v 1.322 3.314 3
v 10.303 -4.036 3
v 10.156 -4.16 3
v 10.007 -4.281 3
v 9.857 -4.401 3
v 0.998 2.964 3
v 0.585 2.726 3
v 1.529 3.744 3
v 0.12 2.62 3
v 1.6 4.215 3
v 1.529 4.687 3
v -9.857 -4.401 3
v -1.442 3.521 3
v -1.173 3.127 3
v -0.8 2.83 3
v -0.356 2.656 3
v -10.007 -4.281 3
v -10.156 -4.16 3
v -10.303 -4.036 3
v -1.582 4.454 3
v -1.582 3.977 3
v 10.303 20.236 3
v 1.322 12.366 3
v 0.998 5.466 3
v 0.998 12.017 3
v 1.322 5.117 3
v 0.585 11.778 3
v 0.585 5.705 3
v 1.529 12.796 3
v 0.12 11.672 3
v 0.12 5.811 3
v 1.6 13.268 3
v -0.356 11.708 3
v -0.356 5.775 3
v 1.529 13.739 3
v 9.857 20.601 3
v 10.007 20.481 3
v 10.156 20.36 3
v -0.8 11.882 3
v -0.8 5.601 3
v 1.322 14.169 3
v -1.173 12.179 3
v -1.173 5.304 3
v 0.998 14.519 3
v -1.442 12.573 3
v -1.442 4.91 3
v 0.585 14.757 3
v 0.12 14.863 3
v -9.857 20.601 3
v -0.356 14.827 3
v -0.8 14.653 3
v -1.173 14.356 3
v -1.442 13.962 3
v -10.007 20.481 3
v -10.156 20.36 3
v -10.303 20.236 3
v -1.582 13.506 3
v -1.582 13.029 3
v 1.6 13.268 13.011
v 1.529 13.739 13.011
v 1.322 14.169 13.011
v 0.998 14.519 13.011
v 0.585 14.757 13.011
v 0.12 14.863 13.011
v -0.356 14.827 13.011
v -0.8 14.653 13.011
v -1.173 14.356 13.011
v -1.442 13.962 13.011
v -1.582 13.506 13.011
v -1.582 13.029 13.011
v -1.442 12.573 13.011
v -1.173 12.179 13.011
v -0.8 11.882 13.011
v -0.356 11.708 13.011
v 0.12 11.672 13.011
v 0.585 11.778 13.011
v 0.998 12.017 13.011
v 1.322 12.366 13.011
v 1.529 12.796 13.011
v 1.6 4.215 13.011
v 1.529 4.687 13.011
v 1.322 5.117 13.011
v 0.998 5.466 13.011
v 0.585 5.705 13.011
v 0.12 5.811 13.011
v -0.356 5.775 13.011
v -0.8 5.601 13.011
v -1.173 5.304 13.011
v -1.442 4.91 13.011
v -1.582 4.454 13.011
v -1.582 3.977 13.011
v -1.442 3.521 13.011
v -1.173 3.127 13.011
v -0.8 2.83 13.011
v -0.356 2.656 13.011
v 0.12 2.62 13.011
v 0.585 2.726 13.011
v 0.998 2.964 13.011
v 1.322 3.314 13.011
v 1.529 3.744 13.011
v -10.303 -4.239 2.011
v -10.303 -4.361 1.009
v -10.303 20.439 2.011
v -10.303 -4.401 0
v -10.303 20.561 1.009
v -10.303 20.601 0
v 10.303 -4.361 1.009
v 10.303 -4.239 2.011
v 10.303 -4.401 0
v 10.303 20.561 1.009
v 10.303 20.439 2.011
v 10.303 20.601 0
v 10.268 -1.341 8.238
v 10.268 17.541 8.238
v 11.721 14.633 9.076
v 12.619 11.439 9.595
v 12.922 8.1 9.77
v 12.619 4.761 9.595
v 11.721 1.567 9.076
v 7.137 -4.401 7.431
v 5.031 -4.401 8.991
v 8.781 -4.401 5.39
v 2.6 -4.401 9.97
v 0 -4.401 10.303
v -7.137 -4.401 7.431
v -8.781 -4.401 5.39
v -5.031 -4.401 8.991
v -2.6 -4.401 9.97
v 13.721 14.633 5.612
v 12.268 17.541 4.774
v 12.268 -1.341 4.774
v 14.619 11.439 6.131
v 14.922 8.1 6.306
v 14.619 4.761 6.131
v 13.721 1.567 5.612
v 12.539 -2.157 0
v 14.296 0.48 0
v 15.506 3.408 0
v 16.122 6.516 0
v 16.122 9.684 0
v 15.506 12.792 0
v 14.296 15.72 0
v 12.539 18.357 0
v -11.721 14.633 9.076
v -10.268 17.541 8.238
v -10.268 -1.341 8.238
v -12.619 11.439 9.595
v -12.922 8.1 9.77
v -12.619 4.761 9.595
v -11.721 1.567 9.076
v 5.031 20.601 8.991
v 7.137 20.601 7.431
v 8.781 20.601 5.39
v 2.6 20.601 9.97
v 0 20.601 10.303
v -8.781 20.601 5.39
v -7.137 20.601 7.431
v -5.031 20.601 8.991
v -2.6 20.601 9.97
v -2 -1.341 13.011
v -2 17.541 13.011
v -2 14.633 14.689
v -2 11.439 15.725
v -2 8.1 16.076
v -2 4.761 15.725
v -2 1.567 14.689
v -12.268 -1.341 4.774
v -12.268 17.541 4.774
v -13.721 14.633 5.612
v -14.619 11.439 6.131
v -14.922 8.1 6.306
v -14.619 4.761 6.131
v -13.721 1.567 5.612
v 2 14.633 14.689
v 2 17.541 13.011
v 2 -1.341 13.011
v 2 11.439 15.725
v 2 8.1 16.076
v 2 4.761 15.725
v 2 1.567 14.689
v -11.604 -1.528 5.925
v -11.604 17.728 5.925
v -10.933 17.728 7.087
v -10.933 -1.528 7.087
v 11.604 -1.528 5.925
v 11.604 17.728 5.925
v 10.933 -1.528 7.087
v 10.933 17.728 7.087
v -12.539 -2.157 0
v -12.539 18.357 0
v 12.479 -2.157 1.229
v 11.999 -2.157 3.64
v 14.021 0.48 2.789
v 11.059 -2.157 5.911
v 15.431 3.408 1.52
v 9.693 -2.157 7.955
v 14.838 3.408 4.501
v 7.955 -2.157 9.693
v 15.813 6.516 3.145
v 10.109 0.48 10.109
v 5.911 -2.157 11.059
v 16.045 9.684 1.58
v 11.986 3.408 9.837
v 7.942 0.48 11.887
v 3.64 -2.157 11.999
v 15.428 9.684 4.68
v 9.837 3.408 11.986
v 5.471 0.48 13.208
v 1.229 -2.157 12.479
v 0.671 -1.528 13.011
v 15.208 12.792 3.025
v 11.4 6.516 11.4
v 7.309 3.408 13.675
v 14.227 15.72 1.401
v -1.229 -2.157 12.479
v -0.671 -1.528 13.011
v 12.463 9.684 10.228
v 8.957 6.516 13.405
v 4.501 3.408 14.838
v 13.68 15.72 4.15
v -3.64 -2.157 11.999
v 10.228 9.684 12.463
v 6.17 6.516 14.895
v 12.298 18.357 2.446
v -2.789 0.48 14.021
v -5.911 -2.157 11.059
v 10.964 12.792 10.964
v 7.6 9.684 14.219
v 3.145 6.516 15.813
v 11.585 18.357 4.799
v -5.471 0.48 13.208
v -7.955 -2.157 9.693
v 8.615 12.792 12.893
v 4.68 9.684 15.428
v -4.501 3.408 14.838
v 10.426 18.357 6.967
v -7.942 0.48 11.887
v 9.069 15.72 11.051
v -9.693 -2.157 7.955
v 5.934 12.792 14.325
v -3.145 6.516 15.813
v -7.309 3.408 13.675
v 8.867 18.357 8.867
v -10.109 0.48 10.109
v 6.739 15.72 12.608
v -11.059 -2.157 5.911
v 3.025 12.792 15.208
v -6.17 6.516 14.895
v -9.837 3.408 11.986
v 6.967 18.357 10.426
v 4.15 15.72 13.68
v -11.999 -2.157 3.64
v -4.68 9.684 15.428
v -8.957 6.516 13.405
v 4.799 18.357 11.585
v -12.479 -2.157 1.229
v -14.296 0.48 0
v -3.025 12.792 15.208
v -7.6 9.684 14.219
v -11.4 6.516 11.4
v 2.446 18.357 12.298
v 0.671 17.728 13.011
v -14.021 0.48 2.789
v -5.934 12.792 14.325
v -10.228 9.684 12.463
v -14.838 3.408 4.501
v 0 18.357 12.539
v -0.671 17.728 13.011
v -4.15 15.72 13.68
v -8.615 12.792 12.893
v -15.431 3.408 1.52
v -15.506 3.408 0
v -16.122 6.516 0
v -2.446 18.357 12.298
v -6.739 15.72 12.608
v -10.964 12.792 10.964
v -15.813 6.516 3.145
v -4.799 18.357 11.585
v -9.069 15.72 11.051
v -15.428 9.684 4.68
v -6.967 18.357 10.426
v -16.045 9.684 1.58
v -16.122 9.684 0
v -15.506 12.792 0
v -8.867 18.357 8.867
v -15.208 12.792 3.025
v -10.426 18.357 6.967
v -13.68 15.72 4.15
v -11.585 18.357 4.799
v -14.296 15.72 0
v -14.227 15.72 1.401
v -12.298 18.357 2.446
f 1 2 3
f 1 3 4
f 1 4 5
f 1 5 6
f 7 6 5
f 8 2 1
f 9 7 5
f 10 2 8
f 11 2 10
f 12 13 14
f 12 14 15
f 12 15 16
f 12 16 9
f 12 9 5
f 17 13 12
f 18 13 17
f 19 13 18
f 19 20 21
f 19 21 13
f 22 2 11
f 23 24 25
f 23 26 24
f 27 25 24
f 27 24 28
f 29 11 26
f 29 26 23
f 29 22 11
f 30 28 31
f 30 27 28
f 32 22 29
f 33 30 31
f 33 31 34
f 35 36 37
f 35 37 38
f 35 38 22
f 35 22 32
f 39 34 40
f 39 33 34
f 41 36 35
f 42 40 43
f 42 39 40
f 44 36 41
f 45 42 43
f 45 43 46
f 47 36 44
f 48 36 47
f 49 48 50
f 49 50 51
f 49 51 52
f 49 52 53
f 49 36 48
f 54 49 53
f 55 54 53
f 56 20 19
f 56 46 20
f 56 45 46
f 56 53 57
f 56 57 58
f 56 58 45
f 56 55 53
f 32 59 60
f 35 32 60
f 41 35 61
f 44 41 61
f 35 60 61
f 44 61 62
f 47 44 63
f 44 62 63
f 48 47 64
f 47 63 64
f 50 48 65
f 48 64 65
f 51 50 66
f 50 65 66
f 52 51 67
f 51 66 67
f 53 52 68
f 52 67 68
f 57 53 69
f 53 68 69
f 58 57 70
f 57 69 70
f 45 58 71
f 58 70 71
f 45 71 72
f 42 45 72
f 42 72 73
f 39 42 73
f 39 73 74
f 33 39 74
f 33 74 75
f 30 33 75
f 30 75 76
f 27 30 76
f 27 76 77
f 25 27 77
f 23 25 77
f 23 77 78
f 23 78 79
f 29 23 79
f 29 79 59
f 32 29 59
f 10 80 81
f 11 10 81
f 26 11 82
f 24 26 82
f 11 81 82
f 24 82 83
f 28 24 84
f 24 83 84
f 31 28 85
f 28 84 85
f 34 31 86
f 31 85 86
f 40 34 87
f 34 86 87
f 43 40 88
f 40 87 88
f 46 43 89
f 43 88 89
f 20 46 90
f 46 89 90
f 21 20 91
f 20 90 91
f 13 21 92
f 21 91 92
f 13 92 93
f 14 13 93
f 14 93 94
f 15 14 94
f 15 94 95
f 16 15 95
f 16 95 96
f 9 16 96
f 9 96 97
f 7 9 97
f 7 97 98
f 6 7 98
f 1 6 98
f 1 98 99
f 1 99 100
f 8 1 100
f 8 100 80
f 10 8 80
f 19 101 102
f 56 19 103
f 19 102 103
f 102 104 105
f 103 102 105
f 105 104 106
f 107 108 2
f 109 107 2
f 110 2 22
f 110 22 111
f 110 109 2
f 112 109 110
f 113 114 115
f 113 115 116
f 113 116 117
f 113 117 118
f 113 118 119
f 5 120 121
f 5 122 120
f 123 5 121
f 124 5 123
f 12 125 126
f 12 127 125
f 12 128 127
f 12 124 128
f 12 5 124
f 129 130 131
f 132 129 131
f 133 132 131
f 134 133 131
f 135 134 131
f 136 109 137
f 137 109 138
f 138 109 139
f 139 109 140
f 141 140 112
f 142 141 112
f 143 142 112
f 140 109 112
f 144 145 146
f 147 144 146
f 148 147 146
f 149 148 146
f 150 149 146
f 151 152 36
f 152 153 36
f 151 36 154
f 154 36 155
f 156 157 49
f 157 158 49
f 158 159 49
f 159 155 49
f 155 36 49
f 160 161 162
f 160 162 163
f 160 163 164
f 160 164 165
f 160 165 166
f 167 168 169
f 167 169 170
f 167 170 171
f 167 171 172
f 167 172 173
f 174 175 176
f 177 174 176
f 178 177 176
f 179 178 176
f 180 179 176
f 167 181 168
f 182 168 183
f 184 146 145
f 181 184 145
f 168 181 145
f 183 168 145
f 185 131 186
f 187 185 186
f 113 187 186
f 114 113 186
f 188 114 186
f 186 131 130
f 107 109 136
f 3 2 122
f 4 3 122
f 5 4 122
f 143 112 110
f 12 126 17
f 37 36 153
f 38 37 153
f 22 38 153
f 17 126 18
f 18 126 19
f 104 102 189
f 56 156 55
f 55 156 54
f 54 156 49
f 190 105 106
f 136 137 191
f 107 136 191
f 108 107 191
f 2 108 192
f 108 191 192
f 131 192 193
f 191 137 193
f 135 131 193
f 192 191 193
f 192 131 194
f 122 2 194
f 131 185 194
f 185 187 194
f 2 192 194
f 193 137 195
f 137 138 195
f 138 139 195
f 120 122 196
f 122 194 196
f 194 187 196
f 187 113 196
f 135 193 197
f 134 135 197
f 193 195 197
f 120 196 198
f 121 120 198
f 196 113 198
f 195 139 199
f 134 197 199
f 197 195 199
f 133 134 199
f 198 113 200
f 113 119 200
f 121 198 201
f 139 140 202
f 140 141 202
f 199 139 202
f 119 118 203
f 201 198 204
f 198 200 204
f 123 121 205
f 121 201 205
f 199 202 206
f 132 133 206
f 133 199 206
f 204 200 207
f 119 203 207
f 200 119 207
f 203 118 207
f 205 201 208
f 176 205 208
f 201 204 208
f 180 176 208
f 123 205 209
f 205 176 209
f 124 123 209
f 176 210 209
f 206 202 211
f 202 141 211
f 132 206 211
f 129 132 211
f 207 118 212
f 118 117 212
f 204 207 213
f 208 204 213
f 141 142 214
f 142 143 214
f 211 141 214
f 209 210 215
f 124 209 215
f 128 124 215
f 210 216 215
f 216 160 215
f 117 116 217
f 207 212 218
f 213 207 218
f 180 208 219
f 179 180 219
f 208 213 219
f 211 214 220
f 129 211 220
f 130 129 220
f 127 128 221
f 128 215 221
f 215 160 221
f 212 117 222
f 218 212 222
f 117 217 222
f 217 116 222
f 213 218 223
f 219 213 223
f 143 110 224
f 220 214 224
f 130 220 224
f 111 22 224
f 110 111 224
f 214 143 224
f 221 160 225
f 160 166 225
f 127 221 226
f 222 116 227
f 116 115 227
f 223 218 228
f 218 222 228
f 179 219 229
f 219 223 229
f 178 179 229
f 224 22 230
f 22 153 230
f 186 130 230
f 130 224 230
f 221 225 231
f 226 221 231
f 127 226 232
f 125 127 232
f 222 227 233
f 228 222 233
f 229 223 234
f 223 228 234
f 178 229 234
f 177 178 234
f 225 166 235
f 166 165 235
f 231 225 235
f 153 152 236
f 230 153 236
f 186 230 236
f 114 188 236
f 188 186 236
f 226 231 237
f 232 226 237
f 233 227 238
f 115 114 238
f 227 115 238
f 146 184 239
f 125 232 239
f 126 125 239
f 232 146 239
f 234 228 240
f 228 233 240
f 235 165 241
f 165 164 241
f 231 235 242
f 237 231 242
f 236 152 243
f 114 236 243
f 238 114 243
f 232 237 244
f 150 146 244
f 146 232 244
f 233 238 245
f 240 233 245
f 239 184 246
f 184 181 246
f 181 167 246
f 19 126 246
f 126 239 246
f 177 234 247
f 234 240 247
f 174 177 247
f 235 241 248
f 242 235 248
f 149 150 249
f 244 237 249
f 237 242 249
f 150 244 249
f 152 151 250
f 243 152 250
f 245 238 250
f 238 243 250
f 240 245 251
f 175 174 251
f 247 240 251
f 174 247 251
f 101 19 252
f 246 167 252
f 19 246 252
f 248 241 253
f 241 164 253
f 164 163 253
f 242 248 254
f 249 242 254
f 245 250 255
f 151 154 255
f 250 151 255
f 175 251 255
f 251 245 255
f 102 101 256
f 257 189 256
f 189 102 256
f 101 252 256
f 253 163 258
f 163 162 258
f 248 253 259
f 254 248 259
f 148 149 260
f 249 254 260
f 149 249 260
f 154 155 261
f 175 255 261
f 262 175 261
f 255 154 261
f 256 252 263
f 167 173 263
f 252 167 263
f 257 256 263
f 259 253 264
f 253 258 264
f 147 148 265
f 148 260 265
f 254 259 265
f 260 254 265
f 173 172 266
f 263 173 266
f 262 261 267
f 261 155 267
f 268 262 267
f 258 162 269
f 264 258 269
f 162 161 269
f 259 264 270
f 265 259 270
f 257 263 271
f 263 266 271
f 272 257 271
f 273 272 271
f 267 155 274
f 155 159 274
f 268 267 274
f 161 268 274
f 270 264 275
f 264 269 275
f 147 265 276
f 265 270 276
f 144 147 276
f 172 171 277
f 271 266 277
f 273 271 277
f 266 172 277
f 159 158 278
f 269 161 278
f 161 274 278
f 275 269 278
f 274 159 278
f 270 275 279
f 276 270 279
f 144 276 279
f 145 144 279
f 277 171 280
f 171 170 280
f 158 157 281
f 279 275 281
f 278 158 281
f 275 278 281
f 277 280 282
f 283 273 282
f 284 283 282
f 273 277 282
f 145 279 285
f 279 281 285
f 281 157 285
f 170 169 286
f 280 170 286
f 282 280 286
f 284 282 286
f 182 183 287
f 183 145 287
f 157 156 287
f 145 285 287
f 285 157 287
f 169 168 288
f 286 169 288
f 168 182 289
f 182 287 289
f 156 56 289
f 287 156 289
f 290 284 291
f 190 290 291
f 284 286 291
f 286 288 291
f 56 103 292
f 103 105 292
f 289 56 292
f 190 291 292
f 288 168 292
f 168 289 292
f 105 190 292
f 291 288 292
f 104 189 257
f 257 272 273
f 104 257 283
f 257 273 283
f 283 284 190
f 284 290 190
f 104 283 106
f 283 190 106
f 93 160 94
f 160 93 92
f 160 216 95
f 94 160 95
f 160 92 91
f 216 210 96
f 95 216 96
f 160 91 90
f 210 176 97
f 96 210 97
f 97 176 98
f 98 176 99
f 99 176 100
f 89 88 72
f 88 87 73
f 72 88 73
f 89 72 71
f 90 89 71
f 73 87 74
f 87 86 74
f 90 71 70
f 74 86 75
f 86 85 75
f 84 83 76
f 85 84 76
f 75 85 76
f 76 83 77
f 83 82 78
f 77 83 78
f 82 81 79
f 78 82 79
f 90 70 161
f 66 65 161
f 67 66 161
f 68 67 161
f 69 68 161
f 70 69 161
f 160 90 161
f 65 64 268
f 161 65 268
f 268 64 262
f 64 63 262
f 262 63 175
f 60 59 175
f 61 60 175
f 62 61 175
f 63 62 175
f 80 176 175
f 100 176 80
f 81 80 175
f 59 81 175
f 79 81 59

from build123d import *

# Parameters (mm, degrees)
REVOLVE6_ANGLE     = 180
CUT_EXTRUDE3_DEPTH = 34.397155568
SKETCH6_W          = 20.606544016
SKETCH6_H          = 25.002606738
CUT_EXTRUDE4_DEPTH = 3
SKETCH15_W         = 5.12502067
SKETCH15_H         = 26.452748528
CUT_EXTRUDE7_DEPTH = 2
CIRPATTERN1_COUNT  = 6
SKETCH20_R         = 1.6
CUT_EXTRUDE8_DEPTH = 30.260079699


with BuildPart() as part:
    # Sketch1 → Revolve6 (revolve)
    with BuildSketch(Plane.XY):
        with BuildLine():
            Line((0, 24.3), (0, -8.1))
            ThreePointArc((0, -8.1), (16.2, 8.1), (0, 24.3))
        make_face()
    revolve(axis=Axis((0, 24.3, 0), (0, -1, 0)), revolution_arc=REVOLVE6_ANGLE)

    # Sketch7 → Cut-Extrude3 (cut, through all)
    with BuildSketch(Plane(origin=(0, 0, 0), x_dir=(-1, 0, 0), z_dir=(0, 0, -1))):
        with BuildLine():
            Line((-10.303272008, 20.601303369), (10.303272008, 20.601303369))
            ThreePointArc((10.303272008, 20.601303369), (0, 24.3), (-10.303272008, 20.601303369))
        make_face()
        with BuildLine():
            Line((-10.303272008, -4.401303369), (10.303272008, -4.401303369))
            ThreePointArc((10.303272008, -4.401303369), (0, -8.1), (-10.303272008, -4.401303369))
        make_face()
    extrude(amount=-CUT_EXTRUDE3_DEPTH, mode=Mode.SUBTRACT)

    # Sketch6 → Cut-Extrude4 (cut)
    with BuildSketch(Plane(origin=(0, 0, 0), x_dir=(-1, 0, 0), z_dir=(0, 0, -1))):
        with Locations((0, 8.1)):
            Rectangle(SKETCH6_W, SKETCH6_H)
    extrude(amount=-CUT_EXTRUDE4_DEPTH, mode=Mode.SUBTRACT)

    # Sketch15 → Cut-Extrude7 (cut, symmetric)
    with BuildSketch(Plane(origin=(0, 0, 0), x_dir=(0, 0, -1), z_dir=(1, 0, 0))):
        with Locations((-15.573988478, 7.374929105)):
            Rectangle(SKETCH15_W, SKETCH15_H)
    cut_extrude7 = extrude(amount=CUT_EXTRUDE7_DEPTH, both=True, mode=Mode.SUBTRACT)

    # CirPattern1: Cut-Extrude7 ×6 about axis
    cirpattern1_axis = Axis((0, 0, 0), (0, 1, 0))
    for i in range(1, CIRPATTERN1_COUNT):
        add(cut_extrude7.rotate(cirpattern1_axis, i * 360 / CIRPATTERN1_COUNT), mode=Mode.SUBTRACT)

    # Sketch20 → Cut-Extrude8 (cut, through all)
    with BuildSketch(Plane.XY.offset(13.011478143)):
        with Locations((0, 13.267578614)):
            Circle(SKETCH20_R)
        with Locations((0, 4.215406421)):
            Circle(SKETCH20_R)
    extrude(amount=-CUT_EXTRUDE8_DEPTH, mode=Mode.SUBTRACT)


solid = part.part
